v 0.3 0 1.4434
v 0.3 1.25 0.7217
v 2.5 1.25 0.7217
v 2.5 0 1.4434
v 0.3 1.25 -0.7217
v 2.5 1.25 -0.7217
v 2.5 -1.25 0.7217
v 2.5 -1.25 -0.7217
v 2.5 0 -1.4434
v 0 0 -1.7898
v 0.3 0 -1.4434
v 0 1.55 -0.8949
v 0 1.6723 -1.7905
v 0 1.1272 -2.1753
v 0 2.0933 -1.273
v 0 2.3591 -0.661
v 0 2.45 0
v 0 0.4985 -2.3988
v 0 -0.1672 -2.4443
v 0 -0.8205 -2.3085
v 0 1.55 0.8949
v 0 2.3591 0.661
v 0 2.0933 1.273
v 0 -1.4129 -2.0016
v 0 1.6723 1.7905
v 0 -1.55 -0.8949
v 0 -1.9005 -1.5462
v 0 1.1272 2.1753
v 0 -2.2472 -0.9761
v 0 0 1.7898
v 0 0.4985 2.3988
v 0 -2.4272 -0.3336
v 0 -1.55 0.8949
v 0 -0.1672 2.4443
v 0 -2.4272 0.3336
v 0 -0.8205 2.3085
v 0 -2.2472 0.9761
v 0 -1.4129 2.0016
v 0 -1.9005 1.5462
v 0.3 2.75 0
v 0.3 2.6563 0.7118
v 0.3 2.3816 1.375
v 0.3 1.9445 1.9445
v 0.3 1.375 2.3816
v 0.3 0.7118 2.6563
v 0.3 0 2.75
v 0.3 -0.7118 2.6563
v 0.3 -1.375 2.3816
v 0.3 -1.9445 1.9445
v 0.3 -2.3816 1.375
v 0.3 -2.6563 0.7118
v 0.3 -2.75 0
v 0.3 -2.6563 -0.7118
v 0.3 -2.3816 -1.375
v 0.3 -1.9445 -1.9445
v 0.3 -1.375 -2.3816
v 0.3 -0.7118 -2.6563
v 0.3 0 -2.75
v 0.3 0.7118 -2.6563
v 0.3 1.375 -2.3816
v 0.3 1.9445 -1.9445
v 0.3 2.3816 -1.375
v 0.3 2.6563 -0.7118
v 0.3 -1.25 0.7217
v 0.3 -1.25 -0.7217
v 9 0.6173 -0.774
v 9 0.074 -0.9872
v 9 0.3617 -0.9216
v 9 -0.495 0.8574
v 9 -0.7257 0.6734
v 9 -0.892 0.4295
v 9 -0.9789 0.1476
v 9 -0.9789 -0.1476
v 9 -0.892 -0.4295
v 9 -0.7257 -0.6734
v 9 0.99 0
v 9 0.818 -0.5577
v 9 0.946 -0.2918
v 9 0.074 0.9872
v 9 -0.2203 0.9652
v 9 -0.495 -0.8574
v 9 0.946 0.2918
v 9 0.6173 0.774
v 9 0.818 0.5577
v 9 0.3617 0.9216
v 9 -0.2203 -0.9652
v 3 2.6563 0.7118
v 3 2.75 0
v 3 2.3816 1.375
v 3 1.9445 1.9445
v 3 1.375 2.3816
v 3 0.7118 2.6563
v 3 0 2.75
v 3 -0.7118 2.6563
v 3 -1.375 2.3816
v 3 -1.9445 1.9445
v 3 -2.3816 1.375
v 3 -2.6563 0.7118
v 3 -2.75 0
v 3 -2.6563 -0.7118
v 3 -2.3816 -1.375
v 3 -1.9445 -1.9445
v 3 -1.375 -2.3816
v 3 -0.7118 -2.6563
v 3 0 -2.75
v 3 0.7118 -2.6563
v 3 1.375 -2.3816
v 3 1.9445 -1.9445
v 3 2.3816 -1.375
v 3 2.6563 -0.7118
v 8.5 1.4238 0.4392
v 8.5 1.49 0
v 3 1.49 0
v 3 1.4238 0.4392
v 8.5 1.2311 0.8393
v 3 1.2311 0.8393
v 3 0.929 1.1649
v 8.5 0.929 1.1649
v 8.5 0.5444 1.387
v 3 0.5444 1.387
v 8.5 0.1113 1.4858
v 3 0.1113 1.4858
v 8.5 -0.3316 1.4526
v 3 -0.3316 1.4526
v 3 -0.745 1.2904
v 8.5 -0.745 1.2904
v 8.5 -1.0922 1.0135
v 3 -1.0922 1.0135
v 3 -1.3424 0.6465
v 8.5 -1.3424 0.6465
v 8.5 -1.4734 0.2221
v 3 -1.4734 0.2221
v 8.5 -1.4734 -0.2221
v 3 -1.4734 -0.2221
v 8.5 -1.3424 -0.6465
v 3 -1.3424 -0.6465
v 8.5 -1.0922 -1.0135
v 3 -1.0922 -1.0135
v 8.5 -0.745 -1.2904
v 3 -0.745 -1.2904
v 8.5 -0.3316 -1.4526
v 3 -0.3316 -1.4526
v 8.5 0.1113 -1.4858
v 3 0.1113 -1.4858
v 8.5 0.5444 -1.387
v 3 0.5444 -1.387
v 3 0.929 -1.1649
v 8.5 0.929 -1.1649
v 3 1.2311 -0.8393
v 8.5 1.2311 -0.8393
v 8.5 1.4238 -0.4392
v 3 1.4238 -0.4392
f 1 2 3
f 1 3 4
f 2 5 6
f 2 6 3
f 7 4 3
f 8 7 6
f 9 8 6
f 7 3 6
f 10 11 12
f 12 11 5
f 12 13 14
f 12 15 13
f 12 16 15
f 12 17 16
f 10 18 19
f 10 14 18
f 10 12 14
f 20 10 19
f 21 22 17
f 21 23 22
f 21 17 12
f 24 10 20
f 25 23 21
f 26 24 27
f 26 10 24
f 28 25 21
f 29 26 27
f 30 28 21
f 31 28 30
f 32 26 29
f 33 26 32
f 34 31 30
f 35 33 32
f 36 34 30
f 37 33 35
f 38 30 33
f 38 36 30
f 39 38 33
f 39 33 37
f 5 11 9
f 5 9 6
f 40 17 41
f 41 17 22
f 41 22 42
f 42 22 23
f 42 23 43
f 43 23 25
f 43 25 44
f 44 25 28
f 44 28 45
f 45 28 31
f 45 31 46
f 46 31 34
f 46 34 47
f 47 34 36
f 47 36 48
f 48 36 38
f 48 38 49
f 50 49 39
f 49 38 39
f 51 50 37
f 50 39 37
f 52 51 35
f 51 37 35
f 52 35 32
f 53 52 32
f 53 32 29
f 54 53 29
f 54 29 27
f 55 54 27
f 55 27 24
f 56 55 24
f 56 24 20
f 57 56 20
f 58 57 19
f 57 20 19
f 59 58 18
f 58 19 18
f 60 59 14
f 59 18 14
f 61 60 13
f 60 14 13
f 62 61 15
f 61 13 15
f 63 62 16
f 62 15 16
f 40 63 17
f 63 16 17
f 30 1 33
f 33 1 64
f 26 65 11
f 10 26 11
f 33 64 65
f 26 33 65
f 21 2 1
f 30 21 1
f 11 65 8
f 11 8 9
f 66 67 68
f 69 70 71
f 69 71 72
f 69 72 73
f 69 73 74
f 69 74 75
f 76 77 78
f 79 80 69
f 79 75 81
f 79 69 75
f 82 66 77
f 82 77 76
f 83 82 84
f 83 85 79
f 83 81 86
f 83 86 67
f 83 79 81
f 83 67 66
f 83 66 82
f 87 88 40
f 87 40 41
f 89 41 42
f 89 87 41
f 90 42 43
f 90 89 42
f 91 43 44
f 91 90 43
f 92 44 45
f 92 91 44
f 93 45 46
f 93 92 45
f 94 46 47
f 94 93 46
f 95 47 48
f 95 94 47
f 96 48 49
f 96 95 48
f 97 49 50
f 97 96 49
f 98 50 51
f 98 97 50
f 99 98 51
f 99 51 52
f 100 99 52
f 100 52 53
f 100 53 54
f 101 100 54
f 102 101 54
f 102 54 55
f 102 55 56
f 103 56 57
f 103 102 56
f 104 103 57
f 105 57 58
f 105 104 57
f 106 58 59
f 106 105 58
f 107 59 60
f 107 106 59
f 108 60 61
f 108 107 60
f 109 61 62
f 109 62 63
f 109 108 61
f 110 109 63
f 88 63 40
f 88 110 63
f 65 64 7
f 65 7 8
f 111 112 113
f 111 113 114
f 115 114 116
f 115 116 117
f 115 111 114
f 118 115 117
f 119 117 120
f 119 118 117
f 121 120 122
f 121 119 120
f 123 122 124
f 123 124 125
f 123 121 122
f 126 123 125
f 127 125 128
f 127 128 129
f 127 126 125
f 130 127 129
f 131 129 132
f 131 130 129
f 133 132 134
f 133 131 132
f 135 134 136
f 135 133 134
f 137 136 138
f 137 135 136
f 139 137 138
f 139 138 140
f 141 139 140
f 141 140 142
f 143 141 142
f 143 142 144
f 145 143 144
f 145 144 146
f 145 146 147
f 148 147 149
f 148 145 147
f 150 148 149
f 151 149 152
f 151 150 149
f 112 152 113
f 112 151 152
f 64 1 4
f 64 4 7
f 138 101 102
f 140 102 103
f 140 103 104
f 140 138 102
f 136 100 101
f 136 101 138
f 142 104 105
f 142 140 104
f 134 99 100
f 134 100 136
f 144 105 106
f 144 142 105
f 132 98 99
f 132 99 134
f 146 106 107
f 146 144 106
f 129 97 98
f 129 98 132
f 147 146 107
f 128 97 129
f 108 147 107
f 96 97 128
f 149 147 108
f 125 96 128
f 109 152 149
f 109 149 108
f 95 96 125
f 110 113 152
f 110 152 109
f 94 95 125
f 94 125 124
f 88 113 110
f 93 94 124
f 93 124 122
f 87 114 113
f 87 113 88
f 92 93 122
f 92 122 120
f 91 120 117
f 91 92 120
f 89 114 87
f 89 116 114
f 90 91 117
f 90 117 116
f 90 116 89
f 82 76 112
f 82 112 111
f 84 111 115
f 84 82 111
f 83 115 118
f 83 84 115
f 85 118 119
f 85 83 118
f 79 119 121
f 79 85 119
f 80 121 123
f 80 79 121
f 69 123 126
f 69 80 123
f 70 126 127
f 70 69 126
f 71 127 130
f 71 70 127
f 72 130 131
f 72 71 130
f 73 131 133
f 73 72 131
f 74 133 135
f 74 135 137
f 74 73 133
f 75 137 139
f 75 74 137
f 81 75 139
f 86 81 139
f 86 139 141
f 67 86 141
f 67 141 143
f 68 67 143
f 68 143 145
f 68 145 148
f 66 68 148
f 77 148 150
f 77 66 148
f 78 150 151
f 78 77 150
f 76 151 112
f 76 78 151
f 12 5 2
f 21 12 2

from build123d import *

# Parameters (mm, degrees)
CHAMFER1_SIZE      = 0.5
CHAMFER2_SIZE      = 0.3
CUT_EXTRUDE1_DEPTH = 2.5
CHAMFER3_SIZE      = 0.3


with BuildPart() as part:
    # Sketch1 → Revolve1 (revolve)
    with BuildSketch(Plane.XY):
        Polygon((0, 0), (0, 2.75), (3, 2.75), (3, 1.49), (9, 1.49), (9, 0), align=None)
    revolve(axis=Axis((-88.705490849, 0, 0), (1, 0, 0)))

    # Chamfer1
    chamfer1_edges = [part.edges().sort_by_distance(p)[0] for p in [
        (9, -1.49, 0),
    ]]
    chamfer(chamfer1_edges, length=CHAMFER1_SIZE)

    # Chamfer2
    chamfer2_edges = [part.edges().sort_by_distance(p)[0] for p in [
        (0, -2.75, 0),
    ]]
    chamfer(chamfer2_edges, length=CHAMFER2_SIZE)

    # Sketch3 → Cut-Extrude1 (cut)
    with BuildSketch(Plane(origin=(0, 0, 0), x_dir=(0, 0, -1), z_dir=(1, 0, 0))):
        Polygon((-1.443375673, 0), (-0.721687836, -1.25), (0.721687836, -1.25), (1.443375673, 0), (0.721687836, 1.25), (-0.721687836, 1.25), align=None)
    extrude(amount=CUT_EXTRUDE1_DEPTH, mode=Mode.SUBTRACT)

    # Chamfer3
    chamfer3_edges = [part.edges().sort_by_distance(p)[0] for p in [
        (0, 0.625, 1.082531755),
        (0, -0.625, 1.082531755),
        (0, -1.25, 0),
        (0, -0.625, -1.082531755),
        (0, 0.625, -1.082531755),
        (0, 1.25, 0),
    ]]
    chamfer(chamfer3_edges, length=CHAMFER3_SIZE)


solid = part.part
